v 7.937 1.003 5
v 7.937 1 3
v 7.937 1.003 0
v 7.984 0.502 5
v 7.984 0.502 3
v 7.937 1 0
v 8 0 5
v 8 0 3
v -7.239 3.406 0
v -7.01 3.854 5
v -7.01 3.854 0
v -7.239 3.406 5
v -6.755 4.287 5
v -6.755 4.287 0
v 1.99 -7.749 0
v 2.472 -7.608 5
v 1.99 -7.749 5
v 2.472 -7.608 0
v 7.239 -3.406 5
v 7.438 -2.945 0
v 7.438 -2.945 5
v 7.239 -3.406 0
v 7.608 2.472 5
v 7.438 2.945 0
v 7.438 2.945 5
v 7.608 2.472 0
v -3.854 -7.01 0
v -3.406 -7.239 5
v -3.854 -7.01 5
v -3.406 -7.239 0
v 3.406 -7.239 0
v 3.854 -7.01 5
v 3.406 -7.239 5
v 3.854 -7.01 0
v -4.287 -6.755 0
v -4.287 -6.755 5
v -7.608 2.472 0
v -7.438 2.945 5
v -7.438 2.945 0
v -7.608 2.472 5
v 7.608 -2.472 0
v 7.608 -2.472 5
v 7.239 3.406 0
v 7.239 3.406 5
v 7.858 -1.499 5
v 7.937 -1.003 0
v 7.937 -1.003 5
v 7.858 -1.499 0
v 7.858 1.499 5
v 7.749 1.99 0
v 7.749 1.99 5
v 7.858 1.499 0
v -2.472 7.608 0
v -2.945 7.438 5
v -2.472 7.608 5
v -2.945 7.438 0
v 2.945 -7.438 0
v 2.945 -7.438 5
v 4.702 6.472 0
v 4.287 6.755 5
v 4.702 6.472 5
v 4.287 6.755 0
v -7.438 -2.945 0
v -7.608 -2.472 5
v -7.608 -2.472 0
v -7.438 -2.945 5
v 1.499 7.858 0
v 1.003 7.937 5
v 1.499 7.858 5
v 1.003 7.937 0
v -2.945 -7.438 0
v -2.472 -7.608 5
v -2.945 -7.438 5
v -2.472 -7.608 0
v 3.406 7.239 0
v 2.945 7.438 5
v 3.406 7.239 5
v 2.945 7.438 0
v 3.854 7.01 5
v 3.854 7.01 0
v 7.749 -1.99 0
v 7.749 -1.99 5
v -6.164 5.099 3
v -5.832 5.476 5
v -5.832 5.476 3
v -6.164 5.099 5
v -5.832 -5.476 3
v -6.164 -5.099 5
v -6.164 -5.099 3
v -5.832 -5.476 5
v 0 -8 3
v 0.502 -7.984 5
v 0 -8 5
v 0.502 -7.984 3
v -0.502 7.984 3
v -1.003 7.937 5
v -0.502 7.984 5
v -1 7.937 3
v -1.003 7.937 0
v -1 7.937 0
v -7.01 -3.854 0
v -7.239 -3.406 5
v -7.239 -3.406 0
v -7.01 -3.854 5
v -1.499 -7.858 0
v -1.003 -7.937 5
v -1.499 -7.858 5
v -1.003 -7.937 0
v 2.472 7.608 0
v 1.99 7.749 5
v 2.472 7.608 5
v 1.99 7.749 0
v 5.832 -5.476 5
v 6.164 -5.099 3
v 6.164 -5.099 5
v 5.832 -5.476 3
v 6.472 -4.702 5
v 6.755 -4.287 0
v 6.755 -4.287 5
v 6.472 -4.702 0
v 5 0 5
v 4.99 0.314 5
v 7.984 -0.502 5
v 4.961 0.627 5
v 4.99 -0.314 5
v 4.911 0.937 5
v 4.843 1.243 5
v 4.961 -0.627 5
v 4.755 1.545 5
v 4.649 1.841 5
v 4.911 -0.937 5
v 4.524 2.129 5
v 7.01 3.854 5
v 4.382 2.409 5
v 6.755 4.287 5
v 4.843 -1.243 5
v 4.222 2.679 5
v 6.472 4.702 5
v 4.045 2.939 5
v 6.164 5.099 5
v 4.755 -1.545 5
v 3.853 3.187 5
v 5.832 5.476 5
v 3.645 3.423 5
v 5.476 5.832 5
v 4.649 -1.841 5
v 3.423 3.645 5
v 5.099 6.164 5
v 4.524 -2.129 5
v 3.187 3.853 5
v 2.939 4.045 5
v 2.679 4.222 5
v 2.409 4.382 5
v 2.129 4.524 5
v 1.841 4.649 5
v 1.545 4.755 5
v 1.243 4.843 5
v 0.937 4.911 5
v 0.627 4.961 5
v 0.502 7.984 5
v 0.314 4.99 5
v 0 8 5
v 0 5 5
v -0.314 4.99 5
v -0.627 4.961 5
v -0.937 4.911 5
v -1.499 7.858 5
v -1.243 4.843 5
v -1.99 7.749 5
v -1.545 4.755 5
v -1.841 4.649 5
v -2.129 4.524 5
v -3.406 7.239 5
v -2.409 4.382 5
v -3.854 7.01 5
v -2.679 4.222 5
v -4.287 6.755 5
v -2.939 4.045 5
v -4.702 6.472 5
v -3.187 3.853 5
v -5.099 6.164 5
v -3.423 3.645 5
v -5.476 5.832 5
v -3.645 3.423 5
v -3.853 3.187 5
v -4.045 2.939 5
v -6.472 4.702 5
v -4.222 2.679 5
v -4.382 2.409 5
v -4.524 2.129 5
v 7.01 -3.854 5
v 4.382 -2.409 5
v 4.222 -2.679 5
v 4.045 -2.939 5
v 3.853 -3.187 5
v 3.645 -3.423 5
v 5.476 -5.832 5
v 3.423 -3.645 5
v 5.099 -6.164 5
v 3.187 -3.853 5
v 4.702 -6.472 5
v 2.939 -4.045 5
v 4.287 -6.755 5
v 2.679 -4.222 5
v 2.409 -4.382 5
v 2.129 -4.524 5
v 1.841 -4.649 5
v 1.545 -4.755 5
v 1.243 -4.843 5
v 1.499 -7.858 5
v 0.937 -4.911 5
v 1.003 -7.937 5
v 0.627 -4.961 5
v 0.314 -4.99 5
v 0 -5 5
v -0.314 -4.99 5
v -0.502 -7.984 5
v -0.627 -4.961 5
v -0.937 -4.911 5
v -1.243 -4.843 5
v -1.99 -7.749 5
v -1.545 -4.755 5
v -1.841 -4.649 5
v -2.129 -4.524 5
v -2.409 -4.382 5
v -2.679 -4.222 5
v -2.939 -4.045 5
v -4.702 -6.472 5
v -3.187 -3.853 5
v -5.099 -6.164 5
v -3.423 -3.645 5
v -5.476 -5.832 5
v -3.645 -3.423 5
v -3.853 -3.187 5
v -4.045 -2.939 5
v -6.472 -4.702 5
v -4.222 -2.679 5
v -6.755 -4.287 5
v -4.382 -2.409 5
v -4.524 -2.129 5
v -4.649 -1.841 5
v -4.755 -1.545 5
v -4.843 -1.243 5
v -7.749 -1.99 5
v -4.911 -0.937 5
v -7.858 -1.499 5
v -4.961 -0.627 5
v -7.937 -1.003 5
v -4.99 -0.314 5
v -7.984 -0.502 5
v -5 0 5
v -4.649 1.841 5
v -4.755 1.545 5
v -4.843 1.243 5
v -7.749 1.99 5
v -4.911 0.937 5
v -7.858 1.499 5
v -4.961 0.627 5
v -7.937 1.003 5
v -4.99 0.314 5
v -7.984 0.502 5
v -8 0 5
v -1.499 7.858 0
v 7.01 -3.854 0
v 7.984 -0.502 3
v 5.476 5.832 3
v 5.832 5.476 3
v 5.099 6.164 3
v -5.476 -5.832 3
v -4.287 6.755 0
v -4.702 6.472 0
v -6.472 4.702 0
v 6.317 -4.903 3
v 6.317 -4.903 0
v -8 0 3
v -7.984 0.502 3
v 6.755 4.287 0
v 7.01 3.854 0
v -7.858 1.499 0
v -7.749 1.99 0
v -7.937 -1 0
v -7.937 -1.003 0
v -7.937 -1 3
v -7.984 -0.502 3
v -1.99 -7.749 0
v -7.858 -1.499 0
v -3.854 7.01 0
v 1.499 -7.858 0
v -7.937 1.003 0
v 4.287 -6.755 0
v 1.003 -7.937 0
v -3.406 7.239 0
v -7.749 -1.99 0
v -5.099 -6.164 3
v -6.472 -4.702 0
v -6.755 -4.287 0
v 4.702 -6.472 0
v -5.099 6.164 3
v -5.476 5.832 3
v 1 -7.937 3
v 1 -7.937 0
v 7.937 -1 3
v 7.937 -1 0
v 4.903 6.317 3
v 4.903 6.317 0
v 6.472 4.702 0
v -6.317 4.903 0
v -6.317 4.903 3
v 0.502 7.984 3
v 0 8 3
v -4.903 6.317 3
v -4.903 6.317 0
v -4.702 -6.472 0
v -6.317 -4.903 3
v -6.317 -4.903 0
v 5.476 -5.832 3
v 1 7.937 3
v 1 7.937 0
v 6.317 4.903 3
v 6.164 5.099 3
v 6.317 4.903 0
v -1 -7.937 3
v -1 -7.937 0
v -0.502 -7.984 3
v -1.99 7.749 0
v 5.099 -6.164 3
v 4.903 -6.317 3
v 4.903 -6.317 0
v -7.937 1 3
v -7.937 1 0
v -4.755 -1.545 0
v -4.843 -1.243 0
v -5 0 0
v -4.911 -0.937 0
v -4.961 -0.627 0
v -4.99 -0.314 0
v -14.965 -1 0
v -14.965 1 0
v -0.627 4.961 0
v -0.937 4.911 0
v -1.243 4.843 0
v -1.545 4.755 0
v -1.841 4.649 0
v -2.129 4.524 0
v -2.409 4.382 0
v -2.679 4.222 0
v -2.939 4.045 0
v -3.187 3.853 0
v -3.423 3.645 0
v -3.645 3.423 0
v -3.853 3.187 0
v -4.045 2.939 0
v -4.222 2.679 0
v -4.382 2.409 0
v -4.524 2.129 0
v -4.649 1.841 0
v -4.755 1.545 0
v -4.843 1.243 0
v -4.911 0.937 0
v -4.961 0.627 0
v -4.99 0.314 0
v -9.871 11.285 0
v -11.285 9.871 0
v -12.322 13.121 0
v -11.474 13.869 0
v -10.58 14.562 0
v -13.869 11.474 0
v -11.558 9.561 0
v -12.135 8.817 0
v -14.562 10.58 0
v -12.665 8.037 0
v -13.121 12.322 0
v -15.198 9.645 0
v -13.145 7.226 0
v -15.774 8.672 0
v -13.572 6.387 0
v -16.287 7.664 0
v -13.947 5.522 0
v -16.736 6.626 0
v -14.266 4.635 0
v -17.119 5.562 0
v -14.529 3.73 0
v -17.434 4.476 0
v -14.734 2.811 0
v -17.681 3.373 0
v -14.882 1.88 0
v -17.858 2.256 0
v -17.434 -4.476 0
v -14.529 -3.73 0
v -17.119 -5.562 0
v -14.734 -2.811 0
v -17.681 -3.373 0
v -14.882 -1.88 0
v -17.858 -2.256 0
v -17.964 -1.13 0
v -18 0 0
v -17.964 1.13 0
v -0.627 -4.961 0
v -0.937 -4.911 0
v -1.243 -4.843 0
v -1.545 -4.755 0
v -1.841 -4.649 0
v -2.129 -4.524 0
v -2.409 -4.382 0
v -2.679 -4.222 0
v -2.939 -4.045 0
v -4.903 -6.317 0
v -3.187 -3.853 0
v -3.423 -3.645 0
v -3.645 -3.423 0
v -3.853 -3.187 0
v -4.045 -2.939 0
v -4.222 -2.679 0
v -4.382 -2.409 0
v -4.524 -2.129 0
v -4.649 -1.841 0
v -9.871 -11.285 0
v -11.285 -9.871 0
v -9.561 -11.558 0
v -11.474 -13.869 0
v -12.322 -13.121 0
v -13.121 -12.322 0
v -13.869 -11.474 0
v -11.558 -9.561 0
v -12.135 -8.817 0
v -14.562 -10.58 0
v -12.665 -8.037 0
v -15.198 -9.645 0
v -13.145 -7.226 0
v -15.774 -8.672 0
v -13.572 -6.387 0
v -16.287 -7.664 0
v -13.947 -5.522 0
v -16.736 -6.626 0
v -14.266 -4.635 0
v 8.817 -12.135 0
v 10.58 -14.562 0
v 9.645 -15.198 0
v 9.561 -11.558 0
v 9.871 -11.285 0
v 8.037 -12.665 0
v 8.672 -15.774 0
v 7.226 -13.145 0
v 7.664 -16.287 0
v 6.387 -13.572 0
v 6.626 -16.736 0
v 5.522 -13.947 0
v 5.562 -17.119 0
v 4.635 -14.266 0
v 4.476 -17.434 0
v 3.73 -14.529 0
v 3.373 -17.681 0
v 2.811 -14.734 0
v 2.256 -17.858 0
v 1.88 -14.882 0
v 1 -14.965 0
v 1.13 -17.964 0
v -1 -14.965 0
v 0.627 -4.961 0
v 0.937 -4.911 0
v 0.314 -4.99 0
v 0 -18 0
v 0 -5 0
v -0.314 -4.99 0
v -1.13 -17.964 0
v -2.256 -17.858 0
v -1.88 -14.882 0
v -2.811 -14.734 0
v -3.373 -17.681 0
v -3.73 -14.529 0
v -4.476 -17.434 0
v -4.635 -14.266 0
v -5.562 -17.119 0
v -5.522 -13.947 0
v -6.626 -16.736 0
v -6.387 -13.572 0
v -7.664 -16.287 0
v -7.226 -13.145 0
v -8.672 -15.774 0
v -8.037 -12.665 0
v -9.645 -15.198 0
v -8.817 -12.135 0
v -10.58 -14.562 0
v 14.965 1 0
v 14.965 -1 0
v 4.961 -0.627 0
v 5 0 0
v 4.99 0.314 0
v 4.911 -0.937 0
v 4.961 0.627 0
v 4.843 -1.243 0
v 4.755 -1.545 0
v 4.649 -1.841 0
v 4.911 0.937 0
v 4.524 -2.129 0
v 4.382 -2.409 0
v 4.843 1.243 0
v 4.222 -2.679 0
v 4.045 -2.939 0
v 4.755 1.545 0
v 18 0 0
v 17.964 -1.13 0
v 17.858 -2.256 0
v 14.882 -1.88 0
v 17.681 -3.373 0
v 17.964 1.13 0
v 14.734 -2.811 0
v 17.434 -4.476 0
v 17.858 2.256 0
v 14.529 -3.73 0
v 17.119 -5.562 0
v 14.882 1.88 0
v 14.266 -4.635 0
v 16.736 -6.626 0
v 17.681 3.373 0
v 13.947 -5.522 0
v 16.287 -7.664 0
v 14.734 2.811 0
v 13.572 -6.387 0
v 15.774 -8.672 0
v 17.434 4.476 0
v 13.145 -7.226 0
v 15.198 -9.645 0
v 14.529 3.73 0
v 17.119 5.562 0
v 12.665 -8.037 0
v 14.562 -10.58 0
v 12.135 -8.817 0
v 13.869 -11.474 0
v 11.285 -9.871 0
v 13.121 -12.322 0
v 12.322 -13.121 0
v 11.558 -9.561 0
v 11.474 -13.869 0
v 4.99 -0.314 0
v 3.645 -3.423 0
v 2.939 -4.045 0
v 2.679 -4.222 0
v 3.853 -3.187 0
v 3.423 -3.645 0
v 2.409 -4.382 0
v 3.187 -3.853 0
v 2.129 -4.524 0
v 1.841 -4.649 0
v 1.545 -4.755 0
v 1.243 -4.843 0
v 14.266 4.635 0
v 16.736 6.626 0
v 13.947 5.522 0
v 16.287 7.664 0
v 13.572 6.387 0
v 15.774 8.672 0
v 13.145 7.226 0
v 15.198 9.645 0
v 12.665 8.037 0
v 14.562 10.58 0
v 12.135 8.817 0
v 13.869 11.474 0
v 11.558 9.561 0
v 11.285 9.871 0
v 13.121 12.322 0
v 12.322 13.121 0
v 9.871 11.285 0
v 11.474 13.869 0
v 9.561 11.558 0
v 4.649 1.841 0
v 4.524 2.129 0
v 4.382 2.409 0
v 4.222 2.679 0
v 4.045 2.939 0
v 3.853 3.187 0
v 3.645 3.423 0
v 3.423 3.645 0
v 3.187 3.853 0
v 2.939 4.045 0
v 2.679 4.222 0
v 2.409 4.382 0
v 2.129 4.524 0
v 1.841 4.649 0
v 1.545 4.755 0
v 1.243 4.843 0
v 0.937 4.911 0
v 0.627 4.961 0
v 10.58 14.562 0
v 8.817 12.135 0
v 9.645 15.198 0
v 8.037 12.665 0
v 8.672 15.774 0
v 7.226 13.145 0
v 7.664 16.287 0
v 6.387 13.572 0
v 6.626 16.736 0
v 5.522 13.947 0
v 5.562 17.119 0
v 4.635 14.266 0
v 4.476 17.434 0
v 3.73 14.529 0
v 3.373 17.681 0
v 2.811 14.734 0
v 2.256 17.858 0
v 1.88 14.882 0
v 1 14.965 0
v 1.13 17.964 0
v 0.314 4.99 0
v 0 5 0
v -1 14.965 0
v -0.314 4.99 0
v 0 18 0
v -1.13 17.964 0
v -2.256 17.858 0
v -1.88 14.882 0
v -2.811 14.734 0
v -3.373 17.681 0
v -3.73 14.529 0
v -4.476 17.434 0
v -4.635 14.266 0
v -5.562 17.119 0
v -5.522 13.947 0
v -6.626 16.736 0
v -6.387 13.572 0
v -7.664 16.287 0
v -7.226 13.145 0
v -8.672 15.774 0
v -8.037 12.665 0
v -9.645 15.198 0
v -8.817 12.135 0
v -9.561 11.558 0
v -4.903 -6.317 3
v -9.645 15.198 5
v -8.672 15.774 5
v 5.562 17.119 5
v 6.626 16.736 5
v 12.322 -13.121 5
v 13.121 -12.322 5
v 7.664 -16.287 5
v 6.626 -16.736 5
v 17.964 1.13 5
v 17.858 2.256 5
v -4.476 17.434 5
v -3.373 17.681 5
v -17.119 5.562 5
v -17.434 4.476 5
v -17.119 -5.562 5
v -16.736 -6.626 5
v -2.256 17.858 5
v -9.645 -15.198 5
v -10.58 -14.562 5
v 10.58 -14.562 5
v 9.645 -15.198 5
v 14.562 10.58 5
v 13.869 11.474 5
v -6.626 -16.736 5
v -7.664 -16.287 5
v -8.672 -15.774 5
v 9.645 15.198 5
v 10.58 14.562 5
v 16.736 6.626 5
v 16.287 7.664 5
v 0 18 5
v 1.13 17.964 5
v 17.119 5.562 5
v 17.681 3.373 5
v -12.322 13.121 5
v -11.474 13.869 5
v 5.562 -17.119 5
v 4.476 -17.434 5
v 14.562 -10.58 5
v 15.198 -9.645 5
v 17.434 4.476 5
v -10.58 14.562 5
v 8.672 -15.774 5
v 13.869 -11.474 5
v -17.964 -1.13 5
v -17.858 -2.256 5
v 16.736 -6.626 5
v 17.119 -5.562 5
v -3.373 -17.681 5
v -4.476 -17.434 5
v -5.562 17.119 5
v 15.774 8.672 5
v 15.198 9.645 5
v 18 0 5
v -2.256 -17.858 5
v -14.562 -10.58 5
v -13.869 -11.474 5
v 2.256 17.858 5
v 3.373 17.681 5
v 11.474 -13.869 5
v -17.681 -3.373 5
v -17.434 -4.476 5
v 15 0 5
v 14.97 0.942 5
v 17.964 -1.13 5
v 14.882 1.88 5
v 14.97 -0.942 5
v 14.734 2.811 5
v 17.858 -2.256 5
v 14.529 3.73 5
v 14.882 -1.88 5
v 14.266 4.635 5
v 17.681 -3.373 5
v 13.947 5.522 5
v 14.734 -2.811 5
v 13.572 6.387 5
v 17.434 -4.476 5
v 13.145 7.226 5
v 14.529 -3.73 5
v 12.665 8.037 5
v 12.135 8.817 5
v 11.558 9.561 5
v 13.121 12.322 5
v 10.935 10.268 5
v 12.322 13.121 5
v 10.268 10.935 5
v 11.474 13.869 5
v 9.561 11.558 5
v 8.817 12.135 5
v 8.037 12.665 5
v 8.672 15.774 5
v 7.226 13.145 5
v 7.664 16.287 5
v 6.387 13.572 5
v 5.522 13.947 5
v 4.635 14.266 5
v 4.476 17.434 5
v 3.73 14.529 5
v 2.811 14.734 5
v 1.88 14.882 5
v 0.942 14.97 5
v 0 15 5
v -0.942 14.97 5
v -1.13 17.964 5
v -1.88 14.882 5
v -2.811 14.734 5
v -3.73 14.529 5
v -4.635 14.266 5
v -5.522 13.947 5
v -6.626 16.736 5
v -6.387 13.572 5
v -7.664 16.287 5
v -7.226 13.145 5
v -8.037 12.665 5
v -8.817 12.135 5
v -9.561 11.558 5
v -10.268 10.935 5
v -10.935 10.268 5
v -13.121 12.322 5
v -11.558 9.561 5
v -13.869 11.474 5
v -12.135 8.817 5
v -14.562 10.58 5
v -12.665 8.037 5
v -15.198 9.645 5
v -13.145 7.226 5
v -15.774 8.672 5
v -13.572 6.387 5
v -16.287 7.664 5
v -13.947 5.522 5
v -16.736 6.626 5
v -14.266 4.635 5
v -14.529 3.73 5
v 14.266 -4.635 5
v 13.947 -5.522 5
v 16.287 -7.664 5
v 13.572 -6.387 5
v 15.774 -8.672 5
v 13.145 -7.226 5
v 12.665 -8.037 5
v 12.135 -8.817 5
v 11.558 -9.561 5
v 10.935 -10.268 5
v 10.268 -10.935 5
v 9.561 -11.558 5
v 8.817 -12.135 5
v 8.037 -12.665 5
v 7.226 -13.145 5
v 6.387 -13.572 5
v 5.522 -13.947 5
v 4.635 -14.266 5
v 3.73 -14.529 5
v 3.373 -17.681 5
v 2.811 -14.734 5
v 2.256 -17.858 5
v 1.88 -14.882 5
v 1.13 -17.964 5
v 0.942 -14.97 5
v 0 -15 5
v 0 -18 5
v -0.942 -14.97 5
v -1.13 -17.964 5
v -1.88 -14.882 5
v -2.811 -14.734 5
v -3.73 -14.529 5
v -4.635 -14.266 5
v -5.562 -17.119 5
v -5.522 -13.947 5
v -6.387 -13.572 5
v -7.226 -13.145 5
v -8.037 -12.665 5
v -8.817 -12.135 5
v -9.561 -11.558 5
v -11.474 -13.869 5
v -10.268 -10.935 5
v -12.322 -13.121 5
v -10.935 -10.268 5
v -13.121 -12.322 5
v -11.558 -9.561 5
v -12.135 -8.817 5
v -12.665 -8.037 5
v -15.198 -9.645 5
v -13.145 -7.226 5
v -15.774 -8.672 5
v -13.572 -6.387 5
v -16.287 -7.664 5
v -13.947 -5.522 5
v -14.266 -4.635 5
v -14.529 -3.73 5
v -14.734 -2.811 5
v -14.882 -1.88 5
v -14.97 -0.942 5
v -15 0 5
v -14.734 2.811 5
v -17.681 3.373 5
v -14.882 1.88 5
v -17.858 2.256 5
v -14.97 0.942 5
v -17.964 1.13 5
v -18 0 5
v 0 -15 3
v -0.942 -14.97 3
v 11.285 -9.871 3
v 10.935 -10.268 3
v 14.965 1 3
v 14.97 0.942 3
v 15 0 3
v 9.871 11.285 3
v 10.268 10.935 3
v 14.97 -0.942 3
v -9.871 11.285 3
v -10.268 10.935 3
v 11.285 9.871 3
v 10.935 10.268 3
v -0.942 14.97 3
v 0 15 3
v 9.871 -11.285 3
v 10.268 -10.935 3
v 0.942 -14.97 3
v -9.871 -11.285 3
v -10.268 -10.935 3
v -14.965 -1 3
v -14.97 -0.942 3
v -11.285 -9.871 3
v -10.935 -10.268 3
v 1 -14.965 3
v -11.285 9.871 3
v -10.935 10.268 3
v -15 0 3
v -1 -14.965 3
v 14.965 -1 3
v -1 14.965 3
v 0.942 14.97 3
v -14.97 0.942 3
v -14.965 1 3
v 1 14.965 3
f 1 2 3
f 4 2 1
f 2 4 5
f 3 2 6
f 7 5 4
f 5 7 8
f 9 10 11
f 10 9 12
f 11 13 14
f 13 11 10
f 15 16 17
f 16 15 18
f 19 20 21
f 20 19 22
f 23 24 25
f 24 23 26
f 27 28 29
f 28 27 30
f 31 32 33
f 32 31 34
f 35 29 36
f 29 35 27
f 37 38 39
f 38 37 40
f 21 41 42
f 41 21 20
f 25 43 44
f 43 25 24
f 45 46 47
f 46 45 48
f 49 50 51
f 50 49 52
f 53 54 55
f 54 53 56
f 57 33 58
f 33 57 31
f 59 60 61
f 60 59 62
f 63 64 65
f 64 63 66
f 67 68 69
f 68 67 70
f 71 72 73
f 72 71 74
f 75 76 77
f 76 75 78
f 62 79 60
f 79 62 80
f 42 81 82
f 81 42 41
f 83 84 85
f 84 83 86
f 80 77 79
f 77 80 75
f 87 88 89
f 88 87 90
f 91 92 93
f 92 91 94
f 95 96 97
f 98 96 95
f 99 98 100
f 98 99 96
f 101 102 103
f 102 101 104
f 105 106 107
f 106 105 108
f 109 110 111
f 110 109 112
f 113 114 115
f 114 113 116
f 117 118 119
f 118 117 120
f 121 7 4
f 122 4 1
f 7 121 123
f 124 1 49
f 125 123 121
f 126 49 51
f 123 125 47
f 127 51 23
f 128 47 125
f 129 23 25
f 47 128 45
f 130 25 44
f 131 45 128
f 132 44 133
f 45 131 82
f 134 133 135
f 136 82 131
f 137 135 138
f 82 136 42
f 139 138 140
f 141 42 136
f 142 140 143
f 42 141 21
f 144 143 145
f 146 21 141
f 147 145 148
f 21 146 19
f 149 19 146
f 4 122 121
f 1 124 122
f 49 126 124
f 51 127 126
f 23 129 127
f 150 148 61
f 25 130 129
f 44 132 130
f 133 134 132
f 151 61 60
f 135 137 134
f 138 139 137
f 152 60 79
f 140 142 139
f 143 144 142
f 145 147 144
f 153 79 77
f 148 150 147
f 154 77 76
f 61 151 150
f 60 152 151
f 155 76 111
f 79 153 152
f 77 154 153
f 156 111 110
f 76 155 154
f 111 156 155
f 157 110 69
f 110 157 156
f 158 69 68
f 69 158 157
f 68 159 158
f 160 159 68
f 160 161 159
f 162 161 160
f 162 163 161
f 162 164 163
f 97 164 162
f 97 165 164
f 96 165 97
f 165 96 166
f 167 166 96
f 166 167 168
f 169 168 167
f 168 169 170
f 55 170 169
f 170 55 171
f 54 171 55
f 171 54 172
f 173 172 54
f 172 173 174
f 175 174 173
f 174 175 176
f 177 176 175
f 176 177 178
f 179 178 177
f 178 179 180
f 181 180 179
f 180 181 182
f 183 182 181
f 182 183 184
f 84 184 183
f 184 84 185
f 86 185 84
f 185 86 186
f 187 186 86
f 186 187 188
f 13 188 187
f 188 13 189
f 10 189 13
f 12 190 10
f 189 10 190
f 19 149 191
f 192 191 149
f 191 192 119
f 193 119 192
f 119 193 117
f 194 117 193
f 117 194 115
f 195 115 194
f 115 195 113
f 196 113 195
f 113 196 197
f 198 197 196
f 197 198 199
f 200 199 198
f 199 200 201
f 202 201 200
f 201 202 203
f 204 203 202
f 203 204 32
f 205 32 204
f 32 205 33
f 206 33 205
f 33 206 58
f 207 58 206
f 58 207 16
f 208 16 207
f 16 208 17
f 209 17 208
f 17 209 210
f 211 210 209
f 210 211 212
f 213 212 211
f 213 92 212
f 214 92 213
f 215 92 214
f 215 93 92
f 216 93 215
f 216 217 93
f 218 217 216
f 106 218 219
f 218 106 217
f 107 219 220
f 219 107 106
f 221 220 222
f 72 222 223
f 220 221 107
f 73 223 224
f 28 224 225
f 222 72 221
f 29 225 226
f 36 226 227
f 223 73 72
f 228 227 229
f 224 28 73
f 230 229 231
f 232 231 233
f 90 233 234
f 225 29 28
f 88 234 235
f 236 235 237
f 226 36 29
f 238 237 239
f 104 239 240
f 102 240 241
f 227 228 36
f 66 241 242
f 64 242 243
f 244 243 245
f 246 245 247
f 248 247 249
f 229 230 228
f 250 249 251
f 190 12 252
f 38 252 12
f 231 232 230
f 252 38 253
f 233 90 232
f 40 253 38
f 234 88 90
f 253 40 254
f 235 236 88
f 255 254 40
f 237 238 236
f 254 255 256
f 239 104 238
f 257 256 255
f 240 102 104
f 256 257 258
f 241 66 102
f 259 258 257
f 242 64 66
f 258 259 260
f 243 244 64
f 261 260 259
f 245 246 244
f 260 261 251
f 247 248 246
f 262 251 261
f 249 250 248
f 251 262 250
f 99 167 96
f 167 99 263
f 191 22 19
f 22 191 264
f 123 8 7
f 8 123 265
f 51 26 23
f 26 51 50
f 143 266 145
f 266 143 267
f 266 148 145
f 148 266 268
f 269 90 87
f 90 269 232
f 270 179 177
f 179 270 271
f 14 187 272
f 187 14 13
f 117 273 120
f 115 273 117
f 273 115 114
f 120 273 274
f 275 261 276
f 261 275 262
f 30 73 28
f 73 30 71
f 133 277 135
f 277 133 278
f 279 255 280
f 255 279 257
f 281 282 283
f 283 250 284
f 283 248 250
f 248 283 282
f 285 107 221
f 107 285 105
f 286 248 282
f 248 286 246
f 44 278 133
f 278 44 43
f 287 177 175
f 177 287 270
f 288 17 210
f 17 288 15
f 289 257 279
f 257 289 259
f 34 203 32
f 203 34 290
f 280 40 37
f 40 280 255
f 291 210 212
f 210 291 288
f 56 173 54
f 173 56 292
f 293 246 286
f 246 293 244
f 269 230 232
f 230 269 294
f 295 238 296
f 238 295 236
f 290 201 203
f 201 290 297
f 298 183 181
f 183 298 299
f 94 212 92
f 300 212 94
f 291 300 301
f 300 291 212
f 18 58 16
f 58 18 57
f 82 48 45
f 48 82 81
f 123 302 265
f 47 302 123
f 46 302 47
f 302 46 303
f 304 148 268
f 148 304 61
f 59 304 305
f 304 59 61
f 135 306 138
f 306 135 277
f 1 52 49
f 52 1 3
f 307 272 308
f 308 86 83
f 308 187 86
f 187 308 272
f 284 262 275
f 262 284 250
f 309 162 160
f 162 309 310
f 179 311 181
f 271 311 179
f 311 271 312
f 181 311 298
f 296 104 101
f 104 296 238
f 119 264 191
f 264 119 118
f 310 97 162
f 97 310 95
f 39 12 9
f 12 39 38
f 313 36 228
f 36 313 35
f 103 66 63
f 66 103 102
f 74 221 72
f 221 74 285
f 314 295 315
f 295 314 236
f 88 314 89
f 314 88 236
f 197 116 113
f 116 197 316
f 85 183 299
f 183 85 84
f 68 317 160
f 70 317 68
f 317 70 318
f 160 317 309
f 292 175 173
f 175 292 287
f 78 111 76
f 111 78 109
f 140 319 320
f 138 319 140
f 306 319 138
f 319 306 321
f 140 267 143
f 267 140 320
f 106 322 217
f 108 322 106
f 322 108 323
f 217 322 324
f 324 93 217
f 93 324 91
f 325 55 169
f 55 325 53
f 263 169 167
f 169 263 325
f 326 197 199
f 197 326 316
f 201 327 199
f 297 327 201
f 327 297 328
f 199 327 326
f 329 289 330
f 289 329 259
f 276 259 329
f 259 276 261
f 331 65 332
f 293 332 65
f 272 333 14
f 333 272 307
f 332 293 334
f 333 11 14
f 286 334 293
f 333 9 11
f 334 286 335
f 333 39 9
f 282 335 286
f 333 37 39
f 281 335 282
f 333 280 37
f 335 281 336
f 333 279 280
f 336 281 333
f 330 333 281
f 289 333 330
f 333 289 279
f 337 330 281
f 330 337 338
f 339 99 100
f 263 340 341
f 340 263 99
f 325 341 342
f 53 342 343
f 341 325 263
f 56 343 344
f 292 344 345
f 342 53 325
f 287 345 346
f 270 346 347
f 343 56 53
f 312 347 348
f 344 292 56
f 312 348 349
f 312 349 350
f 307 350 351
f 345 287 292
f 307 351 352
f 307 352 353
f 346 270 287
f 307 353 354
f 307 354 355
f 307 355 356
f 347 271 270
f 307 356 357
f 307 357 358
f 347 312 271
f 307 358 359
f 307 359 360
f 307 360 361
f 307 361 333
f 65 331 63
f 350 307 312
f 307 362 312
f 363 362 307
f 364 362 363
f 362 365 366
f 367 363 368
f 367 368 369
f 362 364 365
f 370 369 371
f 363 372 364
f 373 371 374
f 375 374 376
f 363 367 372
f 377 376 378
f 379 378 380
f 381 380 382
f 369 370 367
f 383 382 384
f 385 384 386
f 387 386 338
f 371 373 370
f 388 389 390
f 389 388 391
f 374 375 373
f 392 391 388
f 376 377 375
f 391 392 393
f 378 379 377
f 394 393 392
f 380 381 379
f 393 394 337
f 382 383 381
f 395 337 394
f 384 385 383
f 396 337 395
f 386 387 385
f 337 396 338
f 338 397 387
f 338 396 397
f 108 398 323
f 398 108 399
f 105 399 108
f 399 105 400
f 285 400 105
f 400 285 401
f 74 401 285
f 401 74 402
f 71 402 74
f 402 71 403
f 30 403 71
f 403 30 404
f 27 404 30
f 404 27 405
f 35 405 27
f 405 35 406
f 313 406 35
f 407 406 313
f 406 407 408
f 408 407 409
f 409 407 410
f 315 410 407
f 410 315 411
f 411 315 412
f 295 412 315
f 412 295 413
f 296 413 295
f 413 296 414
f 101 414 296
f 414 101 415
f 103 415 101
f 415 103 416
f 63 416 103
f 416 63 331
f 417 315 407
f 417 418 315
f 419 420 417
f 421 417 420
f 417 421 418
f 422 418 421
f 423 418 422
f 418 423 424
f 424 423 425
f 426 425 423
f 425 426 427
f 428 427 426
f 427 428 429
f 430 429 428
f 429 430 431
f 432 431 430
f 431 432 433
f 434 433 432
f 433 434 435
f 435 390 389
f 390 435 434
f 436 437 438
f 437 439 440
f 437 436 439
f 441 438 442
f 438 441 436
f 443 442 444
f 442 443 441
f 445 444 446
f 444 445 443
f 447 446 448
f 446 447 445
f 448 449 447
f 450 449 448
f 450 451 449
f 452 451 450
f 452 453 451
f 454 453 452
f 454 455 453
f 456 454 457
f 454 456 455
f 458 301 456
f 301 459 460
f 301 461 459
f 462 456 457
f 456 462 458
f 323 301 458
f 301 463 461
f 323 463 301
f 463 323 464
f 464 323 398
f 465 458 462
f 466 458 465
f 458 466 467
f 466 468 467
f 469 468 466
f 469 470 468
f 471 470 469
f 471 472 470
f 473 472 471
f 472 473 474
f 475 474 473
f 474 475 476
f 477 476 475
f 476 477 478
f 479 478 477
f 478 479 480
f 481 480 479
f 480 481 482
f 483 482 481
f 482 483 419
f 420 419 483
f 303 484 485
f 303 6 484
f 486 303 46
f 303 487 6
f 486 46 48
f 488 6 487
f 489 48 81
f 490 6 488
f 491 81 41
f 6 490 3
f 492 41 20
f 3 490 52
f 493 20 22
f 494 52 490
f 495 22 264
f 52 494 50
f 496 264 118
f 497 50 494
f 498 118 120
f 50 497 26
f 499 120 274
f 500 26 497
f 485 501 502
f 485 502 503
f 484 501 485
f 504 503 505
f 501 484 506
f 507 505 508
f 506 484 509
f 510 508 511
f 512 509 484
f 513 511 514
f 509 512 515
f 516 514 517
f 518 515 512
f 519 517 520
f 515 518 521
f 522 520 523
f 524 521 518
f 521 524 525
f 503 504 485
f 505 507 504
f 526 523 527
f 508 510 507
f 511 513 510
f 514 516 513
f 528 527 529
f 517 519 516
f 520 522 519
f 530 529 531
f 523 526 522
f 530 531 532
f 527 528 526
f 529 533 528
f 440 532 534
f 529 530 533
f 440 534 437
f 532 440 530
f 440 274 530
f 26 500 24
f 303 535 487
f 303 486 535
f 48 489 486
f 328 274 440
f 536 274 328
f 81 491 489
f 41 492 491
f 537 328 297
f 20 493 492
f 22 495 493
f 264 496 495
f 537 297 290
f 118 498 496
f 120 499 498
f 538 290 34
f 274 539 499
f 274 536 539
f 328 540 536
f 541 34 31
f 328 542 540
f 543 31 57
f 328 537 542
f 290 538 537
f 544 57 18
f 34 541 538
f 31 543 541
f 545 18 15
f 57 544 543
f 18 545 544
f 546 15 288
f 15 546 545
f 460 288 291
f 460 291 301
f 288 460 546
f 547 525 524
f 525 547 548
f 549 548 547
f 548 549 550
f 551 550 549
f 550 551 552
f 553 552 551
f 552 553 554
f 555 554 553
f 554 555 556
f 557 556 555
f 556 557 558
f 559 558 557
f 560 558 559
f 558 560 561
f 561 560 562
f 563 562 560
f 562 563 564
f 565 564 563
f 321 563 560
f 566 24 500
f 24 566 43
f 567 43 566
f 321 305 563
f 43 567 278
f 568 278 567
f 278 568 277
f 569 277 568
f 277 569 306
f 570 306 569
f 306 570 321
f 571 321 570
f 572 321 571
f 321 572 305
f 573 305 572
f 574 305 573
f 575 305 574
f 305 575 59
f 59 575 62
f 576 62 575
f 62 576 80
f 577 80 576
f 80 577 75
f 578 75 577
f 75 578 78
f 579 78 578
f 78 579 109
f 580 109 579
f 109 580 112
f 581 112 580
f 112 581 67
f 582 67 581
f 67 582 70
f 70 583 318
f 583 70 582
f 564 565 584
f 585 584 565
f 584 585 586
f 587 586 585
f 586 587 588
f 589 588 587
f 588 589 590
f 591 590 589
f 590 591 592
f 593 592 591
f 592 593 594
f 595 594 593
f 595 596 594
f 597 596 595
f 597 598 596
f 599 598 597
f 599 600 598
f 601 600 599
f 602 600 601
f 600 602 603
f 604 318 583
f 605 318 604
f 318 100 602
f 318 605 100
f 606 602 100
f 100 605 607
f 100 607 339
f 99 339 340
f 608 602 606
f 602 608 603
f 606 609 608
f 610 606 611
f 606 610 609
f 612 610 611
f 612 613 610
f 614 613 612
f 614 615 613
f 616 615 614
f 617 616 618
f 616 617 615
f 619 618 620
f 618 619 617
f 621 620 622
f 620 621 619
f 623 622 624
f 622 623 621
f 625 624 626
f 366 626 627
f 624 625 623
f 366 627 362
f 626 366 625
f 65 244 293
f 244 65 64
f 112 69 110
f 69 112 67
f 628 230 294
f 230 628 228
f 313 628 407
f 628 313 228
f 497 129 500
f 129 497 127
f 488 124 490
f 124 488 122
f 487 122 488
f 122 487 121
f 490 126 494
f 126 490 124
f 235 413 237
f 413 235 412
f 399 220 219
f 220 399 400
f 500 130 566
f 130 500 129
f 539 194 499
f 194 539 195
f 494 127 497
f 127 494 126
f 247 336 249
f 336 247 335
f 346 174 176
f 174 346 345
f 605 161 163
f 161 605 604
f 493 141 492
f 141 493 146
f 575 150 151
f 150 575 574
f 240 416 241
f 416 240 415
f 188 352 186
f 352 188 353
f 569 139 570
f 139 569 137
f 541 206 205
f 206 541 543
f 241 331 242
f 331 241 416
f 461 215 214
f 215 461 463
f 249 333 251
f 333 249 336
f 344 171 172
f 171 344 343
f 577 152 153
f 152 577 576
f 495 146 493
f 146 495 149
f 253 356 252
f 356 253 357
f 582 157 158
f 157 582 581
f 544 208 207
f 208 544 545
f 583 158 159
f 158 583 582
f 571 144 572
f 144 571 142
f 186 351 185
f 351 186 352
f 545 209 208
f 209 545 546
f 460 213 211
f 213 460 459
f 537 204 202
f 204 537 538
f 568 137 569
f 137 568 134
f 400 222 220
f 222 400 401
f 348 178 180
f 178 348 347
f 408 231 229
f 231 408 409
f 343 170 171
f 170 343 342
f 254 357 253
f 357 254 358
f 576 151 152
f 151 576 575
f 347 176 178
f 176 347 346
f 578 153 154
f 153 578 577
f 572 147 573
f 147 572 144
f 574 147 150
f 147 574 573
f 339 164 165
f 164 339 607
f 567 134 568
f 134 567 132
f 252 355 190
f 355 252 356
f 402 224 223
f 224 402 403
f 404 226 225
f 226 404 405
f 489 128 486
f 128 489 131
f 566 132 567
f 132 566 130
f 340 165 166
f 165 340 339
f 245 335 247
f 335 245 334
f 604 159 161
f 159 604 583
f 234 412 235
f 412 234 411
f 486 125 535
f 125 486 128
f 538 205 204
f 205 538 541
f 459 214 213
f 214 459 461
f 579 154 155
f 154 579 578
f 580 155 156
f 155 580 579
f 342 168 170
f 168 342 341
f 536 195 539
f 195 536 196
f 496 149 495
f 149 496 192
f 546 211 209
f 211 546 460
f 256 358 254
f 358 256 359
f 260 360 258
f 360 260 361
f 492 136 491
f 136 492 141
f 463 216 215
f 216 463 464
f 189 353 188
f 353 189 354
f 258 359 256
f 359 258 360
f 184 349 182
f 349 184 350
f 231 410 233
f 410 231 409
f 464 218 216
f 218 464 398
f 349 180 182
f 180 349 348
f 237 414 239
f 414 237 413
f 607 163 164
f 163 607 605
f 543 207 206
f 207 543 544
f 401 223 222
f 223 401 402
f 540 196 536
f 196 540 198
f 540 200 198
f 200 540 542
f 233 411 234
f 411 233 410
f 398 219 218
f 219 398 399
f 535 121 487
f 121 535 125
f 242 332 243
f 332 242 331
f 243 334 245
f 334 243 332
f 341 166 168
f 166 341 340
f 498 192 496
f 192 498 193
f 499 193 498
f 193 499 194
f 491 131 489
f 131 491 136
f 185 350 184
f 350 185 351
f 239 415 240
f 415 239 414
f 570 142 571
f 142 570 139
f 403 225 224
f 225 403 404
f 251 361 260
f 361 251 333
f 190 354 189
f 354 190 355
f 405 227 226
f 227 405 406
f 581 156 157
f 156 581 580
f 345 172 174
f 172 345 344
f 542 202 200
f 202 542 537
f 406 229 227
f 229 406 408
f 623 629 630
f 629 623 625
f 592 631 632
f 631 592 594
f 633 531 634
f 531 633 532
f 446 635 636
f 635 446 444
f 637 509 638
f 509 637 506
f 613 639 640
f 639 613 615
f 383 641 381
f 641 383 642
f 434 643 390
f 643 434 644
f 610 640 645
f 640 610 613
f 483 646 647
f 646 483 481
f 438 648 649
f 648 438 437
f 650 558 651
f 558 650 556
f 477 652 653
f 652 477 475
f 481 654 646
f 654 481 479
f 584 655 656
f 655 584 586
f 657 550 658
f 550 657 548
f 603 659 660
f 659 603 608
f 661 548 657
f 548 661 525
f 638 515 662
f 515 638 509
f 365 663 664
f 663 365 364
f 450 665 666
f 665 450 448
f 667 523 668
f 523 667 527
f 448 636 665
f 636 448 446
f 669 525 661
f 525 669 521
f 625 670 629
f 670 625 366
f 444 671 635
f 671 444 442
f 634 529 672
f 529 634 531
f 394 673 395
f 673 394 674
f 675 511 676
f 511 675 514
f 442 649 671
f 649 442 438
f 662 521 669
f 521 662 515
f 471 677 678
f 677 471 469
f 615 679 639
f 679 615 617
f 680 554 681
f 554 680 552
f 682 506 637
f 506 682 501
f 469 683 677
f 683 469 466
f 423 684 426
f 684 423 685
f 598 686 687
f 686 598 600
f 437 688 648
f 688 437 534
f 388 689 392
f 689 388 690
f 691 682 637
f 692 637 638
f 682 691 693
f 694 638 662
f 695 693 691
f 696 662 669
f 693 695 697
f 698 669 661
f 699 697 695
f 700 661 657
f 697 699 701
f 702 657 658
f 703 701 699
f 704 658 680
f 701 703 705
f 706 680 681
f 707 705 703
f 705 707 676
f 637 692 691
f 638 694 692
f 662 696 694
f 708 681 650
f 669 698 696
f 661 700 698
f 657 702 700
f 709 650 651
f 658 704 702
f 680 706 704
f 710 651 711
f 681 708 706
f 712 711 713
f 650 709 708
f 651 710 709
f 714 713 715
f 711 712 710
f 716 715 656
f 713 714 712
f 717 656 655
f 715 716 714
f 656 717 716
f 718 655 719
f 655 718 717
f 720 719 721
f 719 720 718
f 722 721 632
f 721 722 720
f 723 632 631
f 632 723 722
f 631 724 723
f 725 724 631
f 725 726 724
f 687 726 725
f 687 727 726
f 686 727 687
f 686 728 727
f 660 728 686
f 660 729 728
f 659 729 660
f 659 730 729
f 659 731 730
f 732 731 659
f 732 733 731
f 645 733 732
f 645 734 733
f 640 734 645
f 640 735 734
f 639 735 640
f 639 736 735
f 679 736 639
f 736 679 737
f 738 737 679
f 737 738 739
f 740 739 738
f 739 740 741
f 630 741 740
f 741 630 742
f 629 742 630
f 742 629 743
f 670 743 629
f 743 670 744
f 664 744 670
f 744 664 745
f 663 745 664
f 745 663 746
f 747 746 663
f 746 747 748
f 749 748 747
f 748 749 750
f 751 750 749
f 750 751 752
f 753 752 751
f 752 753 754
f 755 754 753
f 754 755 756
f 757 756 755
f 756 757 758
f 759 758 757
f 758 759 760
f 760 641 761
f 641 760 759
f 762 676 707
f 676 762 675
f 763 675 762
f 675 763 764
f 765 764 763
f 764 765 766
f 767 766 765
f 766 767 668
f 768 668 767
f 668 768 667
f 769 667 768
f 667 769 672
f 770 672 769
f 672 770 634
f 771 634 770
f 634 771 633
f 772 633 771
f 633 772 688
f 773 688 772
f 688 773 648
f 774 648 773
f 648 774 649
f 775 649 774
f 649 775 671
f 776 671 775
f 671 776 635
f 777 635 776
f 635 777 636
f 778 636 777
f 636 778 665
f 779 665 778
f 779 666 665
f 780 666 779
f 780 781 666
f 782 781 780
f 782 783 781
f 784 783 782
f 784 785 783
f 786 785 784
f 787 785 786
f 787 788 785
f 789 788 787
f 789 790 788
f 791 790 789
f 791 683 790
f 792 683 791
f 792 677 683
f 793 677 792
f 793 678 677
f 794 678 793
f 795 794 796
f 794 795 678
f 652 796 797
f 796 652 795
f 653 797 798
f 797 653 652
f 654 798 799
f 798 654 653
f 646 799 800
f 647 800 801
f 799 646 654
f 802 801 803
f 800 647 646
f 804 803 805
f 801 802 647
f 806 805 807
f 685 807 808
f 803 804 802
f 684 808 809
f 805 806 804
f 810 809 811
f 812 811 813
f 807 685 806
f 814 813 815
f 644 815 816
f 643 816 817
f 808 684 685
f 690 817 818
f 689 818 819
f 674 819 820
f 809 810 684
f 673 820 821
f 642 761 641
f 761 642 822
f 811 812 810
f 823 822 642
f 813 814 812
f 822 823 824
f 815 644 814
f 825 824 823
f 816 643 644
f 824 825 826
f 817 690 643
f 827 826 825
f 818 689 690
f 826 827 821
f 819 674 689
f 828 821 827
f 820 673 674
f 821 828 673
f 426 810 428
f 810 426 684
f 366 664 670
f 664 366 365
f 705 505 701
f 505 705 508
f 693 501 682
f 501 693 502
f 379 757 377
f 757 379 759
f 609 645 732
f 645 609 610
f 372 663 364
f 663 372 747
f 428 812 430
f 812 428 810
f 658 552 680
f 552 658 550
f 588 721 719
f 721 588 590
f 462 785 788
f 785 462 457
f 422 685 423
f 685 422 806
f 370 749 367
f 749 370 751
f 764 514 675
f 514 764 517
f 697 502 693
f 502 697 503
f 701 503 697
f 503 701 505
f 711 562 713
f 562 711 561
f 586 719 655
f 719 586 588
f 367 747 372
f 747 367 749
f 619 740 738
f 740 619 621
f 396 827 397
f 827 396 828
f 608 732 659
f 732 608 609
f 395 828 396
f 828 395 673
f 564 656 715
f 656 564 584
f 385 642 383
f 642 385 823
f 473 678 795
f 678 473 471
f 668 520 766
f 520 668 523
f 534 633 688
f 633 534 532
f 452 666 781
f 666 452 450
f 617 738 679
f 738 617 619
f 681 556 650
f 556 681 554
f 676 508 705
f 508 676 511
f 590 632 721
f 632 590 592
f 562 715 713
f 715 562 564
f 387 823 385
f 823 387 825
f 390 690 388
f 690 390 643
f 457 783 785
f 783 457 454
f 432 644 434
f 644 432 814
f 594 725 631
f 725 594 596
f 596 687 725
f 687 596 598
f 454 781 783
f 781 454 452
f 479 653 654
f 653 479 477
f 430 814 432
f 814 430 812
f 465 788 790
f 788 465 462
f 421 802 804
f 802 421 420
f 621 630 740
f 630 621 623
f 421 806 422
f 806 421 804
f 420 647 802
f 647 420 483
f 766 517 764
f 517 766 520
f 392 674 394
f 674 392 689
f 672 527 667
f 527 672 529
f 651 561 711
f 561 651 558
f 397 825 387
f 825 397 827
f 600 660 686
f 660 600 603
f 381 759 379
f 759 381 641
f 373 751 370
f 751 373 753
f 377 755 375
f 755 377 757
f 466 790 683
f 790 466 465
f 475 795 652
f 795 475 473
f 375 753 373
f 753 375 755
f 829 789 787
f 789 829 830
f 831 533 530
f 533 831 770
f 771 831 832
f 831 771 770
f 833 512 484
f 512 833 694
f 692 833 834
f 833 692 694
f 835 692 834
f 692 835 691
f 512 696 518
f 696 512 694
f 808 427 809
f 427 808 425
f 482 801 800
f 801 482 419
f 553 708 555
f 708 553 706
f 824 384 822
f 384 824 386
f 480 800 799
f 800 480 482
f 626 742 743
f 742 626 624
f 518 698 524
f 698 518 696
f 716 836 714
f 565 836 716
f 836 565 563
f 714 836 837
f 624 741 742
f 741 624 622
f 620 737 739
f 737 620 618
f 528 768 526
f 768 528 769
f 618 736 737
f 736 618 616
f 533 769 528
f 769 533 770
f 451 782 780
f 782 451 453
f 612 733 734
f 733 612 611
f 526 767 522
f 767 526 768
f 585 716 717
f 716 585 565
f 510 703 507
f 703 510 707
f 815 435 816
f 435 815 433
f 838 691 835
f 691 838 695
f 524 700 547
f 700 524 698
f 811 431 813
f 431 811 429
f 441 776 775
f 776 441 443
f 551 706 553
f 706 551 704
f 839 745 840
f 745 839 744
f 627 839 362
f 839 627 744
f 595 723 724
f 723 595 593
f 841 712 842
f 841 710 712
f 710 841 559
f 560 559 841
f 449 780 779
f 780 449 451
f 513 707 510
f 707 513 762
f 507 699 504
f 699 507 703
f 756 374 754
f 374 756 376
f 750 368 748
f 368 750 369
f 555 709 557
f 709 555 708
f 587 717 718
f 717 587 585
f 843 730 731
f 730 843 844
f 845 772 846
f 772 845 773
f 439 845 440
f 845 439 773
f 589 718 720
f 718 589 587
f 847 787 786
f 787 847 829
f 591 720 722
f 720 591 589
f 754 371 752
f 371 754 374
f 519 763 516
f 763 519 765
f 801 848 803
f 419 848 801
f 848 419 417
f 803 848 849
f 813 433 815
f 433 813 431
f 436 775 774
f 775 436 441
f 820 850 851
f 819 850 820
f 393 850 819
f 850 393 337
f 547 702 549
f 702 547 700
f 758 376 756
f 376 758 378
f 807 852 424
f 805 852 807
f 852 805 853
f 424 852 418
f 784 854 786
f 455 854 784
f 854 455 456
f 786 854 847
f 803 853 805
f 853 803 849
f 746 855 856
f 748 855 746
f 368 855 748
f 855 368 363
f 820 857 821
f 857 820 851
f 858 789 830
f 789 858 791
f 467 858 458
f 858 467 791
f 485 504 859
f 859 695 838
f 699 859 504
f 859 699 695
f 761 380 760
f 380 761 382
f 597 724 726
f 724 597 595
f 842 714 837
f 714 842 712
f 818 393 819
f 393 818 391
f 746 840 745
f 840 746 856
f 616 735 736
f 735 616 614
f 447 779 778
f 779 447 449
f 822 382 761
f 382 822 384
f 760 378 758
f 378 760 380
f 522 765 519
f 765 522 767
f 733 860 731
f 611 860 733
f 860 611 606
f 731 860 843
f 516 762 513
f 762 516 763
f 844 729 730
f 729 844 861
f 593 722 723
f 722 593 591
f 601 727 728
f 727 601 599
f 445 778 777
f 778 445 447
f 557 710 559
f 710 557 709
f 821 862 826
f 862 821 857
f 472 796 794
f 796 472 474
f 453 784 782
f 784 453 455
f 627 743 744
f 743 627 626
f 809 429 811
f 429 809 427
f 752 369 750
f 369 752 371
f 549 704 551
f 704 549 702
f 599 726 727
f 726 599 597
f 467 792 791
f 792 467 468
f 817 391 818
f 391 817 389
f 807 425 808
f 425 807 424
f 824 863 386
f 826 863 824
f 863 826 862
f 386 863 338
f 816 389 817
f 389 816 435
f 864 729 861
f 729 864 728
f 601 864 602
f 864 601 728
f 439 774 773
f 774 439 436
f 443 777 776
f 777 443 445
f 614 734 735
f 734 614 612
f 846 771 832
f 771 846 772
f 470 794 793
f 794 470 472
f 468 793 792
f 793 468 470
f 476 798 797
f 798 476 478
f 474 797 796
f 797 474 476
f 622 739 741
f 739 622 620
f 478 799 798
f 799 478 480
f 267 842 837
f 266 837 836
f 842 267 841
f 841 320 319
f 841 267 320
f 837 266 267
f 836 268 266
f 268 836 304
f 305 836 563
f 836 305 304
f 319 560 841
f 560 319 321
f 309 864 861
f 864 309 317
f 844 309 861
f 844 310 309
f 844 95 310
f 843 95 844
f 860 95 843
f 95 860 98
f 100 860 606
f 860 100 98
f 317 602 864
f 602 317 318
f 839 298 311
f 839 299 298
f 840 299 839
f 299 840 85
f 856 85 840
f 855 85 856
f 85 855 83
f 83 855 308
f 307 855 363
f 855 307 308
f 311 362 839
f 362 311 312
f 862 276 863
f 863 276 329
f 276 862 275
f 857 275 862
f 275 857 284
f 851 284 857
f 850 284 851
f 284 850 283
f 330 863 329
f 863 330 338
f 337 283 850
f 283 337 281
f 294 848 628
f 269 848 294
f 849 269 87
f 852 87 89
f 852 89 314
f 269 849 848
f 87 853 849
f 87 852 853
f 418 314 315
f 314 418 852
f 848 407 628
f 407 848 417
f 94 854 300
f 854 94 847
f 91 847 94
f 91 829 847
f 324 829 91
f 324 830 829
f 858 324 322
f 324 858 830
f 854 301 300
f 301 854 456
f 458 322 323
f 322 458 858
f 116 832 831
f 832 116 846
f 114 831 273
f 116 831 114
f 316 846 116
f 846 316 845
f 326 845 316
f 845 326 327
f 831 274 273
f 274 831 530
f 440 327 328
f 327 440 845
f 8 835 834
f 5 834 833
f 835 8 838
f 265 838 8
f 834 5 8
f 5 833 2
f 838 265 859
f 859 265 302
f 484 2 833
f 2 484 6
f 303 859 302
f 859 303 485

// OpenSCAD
// Daniel Seijas Iglesias <seijasdeveloper@gmail.com>
// ruedas incubadora

$fn = 100;

radio = 18;
eje = 5;
grosor = 5;
extra_grosor = 3;

n_radios = 8;

// eje
difference(){
    cylinder(r=eje+extra_grosor, h=grosor);
    
    translate([0, 0, -0.05])
        cylinder(r=eje, h=grosor+0.1);
}

// cubierta
difference(){
    cylinder(r=radio, h=grosor);
    
    translate([0, 0, -0.05])
        cylinder(r=radio-extra_grosor, h=grosor+0.1);
}

// radios
for(i = [1:n_radios]){
    rotate([0, 0, 360/n_radios*i])
    translate([eje+extra_grosor/2, -1, 0])
        cube([radio-eje-extra_grosor, 2, 3]);
}
